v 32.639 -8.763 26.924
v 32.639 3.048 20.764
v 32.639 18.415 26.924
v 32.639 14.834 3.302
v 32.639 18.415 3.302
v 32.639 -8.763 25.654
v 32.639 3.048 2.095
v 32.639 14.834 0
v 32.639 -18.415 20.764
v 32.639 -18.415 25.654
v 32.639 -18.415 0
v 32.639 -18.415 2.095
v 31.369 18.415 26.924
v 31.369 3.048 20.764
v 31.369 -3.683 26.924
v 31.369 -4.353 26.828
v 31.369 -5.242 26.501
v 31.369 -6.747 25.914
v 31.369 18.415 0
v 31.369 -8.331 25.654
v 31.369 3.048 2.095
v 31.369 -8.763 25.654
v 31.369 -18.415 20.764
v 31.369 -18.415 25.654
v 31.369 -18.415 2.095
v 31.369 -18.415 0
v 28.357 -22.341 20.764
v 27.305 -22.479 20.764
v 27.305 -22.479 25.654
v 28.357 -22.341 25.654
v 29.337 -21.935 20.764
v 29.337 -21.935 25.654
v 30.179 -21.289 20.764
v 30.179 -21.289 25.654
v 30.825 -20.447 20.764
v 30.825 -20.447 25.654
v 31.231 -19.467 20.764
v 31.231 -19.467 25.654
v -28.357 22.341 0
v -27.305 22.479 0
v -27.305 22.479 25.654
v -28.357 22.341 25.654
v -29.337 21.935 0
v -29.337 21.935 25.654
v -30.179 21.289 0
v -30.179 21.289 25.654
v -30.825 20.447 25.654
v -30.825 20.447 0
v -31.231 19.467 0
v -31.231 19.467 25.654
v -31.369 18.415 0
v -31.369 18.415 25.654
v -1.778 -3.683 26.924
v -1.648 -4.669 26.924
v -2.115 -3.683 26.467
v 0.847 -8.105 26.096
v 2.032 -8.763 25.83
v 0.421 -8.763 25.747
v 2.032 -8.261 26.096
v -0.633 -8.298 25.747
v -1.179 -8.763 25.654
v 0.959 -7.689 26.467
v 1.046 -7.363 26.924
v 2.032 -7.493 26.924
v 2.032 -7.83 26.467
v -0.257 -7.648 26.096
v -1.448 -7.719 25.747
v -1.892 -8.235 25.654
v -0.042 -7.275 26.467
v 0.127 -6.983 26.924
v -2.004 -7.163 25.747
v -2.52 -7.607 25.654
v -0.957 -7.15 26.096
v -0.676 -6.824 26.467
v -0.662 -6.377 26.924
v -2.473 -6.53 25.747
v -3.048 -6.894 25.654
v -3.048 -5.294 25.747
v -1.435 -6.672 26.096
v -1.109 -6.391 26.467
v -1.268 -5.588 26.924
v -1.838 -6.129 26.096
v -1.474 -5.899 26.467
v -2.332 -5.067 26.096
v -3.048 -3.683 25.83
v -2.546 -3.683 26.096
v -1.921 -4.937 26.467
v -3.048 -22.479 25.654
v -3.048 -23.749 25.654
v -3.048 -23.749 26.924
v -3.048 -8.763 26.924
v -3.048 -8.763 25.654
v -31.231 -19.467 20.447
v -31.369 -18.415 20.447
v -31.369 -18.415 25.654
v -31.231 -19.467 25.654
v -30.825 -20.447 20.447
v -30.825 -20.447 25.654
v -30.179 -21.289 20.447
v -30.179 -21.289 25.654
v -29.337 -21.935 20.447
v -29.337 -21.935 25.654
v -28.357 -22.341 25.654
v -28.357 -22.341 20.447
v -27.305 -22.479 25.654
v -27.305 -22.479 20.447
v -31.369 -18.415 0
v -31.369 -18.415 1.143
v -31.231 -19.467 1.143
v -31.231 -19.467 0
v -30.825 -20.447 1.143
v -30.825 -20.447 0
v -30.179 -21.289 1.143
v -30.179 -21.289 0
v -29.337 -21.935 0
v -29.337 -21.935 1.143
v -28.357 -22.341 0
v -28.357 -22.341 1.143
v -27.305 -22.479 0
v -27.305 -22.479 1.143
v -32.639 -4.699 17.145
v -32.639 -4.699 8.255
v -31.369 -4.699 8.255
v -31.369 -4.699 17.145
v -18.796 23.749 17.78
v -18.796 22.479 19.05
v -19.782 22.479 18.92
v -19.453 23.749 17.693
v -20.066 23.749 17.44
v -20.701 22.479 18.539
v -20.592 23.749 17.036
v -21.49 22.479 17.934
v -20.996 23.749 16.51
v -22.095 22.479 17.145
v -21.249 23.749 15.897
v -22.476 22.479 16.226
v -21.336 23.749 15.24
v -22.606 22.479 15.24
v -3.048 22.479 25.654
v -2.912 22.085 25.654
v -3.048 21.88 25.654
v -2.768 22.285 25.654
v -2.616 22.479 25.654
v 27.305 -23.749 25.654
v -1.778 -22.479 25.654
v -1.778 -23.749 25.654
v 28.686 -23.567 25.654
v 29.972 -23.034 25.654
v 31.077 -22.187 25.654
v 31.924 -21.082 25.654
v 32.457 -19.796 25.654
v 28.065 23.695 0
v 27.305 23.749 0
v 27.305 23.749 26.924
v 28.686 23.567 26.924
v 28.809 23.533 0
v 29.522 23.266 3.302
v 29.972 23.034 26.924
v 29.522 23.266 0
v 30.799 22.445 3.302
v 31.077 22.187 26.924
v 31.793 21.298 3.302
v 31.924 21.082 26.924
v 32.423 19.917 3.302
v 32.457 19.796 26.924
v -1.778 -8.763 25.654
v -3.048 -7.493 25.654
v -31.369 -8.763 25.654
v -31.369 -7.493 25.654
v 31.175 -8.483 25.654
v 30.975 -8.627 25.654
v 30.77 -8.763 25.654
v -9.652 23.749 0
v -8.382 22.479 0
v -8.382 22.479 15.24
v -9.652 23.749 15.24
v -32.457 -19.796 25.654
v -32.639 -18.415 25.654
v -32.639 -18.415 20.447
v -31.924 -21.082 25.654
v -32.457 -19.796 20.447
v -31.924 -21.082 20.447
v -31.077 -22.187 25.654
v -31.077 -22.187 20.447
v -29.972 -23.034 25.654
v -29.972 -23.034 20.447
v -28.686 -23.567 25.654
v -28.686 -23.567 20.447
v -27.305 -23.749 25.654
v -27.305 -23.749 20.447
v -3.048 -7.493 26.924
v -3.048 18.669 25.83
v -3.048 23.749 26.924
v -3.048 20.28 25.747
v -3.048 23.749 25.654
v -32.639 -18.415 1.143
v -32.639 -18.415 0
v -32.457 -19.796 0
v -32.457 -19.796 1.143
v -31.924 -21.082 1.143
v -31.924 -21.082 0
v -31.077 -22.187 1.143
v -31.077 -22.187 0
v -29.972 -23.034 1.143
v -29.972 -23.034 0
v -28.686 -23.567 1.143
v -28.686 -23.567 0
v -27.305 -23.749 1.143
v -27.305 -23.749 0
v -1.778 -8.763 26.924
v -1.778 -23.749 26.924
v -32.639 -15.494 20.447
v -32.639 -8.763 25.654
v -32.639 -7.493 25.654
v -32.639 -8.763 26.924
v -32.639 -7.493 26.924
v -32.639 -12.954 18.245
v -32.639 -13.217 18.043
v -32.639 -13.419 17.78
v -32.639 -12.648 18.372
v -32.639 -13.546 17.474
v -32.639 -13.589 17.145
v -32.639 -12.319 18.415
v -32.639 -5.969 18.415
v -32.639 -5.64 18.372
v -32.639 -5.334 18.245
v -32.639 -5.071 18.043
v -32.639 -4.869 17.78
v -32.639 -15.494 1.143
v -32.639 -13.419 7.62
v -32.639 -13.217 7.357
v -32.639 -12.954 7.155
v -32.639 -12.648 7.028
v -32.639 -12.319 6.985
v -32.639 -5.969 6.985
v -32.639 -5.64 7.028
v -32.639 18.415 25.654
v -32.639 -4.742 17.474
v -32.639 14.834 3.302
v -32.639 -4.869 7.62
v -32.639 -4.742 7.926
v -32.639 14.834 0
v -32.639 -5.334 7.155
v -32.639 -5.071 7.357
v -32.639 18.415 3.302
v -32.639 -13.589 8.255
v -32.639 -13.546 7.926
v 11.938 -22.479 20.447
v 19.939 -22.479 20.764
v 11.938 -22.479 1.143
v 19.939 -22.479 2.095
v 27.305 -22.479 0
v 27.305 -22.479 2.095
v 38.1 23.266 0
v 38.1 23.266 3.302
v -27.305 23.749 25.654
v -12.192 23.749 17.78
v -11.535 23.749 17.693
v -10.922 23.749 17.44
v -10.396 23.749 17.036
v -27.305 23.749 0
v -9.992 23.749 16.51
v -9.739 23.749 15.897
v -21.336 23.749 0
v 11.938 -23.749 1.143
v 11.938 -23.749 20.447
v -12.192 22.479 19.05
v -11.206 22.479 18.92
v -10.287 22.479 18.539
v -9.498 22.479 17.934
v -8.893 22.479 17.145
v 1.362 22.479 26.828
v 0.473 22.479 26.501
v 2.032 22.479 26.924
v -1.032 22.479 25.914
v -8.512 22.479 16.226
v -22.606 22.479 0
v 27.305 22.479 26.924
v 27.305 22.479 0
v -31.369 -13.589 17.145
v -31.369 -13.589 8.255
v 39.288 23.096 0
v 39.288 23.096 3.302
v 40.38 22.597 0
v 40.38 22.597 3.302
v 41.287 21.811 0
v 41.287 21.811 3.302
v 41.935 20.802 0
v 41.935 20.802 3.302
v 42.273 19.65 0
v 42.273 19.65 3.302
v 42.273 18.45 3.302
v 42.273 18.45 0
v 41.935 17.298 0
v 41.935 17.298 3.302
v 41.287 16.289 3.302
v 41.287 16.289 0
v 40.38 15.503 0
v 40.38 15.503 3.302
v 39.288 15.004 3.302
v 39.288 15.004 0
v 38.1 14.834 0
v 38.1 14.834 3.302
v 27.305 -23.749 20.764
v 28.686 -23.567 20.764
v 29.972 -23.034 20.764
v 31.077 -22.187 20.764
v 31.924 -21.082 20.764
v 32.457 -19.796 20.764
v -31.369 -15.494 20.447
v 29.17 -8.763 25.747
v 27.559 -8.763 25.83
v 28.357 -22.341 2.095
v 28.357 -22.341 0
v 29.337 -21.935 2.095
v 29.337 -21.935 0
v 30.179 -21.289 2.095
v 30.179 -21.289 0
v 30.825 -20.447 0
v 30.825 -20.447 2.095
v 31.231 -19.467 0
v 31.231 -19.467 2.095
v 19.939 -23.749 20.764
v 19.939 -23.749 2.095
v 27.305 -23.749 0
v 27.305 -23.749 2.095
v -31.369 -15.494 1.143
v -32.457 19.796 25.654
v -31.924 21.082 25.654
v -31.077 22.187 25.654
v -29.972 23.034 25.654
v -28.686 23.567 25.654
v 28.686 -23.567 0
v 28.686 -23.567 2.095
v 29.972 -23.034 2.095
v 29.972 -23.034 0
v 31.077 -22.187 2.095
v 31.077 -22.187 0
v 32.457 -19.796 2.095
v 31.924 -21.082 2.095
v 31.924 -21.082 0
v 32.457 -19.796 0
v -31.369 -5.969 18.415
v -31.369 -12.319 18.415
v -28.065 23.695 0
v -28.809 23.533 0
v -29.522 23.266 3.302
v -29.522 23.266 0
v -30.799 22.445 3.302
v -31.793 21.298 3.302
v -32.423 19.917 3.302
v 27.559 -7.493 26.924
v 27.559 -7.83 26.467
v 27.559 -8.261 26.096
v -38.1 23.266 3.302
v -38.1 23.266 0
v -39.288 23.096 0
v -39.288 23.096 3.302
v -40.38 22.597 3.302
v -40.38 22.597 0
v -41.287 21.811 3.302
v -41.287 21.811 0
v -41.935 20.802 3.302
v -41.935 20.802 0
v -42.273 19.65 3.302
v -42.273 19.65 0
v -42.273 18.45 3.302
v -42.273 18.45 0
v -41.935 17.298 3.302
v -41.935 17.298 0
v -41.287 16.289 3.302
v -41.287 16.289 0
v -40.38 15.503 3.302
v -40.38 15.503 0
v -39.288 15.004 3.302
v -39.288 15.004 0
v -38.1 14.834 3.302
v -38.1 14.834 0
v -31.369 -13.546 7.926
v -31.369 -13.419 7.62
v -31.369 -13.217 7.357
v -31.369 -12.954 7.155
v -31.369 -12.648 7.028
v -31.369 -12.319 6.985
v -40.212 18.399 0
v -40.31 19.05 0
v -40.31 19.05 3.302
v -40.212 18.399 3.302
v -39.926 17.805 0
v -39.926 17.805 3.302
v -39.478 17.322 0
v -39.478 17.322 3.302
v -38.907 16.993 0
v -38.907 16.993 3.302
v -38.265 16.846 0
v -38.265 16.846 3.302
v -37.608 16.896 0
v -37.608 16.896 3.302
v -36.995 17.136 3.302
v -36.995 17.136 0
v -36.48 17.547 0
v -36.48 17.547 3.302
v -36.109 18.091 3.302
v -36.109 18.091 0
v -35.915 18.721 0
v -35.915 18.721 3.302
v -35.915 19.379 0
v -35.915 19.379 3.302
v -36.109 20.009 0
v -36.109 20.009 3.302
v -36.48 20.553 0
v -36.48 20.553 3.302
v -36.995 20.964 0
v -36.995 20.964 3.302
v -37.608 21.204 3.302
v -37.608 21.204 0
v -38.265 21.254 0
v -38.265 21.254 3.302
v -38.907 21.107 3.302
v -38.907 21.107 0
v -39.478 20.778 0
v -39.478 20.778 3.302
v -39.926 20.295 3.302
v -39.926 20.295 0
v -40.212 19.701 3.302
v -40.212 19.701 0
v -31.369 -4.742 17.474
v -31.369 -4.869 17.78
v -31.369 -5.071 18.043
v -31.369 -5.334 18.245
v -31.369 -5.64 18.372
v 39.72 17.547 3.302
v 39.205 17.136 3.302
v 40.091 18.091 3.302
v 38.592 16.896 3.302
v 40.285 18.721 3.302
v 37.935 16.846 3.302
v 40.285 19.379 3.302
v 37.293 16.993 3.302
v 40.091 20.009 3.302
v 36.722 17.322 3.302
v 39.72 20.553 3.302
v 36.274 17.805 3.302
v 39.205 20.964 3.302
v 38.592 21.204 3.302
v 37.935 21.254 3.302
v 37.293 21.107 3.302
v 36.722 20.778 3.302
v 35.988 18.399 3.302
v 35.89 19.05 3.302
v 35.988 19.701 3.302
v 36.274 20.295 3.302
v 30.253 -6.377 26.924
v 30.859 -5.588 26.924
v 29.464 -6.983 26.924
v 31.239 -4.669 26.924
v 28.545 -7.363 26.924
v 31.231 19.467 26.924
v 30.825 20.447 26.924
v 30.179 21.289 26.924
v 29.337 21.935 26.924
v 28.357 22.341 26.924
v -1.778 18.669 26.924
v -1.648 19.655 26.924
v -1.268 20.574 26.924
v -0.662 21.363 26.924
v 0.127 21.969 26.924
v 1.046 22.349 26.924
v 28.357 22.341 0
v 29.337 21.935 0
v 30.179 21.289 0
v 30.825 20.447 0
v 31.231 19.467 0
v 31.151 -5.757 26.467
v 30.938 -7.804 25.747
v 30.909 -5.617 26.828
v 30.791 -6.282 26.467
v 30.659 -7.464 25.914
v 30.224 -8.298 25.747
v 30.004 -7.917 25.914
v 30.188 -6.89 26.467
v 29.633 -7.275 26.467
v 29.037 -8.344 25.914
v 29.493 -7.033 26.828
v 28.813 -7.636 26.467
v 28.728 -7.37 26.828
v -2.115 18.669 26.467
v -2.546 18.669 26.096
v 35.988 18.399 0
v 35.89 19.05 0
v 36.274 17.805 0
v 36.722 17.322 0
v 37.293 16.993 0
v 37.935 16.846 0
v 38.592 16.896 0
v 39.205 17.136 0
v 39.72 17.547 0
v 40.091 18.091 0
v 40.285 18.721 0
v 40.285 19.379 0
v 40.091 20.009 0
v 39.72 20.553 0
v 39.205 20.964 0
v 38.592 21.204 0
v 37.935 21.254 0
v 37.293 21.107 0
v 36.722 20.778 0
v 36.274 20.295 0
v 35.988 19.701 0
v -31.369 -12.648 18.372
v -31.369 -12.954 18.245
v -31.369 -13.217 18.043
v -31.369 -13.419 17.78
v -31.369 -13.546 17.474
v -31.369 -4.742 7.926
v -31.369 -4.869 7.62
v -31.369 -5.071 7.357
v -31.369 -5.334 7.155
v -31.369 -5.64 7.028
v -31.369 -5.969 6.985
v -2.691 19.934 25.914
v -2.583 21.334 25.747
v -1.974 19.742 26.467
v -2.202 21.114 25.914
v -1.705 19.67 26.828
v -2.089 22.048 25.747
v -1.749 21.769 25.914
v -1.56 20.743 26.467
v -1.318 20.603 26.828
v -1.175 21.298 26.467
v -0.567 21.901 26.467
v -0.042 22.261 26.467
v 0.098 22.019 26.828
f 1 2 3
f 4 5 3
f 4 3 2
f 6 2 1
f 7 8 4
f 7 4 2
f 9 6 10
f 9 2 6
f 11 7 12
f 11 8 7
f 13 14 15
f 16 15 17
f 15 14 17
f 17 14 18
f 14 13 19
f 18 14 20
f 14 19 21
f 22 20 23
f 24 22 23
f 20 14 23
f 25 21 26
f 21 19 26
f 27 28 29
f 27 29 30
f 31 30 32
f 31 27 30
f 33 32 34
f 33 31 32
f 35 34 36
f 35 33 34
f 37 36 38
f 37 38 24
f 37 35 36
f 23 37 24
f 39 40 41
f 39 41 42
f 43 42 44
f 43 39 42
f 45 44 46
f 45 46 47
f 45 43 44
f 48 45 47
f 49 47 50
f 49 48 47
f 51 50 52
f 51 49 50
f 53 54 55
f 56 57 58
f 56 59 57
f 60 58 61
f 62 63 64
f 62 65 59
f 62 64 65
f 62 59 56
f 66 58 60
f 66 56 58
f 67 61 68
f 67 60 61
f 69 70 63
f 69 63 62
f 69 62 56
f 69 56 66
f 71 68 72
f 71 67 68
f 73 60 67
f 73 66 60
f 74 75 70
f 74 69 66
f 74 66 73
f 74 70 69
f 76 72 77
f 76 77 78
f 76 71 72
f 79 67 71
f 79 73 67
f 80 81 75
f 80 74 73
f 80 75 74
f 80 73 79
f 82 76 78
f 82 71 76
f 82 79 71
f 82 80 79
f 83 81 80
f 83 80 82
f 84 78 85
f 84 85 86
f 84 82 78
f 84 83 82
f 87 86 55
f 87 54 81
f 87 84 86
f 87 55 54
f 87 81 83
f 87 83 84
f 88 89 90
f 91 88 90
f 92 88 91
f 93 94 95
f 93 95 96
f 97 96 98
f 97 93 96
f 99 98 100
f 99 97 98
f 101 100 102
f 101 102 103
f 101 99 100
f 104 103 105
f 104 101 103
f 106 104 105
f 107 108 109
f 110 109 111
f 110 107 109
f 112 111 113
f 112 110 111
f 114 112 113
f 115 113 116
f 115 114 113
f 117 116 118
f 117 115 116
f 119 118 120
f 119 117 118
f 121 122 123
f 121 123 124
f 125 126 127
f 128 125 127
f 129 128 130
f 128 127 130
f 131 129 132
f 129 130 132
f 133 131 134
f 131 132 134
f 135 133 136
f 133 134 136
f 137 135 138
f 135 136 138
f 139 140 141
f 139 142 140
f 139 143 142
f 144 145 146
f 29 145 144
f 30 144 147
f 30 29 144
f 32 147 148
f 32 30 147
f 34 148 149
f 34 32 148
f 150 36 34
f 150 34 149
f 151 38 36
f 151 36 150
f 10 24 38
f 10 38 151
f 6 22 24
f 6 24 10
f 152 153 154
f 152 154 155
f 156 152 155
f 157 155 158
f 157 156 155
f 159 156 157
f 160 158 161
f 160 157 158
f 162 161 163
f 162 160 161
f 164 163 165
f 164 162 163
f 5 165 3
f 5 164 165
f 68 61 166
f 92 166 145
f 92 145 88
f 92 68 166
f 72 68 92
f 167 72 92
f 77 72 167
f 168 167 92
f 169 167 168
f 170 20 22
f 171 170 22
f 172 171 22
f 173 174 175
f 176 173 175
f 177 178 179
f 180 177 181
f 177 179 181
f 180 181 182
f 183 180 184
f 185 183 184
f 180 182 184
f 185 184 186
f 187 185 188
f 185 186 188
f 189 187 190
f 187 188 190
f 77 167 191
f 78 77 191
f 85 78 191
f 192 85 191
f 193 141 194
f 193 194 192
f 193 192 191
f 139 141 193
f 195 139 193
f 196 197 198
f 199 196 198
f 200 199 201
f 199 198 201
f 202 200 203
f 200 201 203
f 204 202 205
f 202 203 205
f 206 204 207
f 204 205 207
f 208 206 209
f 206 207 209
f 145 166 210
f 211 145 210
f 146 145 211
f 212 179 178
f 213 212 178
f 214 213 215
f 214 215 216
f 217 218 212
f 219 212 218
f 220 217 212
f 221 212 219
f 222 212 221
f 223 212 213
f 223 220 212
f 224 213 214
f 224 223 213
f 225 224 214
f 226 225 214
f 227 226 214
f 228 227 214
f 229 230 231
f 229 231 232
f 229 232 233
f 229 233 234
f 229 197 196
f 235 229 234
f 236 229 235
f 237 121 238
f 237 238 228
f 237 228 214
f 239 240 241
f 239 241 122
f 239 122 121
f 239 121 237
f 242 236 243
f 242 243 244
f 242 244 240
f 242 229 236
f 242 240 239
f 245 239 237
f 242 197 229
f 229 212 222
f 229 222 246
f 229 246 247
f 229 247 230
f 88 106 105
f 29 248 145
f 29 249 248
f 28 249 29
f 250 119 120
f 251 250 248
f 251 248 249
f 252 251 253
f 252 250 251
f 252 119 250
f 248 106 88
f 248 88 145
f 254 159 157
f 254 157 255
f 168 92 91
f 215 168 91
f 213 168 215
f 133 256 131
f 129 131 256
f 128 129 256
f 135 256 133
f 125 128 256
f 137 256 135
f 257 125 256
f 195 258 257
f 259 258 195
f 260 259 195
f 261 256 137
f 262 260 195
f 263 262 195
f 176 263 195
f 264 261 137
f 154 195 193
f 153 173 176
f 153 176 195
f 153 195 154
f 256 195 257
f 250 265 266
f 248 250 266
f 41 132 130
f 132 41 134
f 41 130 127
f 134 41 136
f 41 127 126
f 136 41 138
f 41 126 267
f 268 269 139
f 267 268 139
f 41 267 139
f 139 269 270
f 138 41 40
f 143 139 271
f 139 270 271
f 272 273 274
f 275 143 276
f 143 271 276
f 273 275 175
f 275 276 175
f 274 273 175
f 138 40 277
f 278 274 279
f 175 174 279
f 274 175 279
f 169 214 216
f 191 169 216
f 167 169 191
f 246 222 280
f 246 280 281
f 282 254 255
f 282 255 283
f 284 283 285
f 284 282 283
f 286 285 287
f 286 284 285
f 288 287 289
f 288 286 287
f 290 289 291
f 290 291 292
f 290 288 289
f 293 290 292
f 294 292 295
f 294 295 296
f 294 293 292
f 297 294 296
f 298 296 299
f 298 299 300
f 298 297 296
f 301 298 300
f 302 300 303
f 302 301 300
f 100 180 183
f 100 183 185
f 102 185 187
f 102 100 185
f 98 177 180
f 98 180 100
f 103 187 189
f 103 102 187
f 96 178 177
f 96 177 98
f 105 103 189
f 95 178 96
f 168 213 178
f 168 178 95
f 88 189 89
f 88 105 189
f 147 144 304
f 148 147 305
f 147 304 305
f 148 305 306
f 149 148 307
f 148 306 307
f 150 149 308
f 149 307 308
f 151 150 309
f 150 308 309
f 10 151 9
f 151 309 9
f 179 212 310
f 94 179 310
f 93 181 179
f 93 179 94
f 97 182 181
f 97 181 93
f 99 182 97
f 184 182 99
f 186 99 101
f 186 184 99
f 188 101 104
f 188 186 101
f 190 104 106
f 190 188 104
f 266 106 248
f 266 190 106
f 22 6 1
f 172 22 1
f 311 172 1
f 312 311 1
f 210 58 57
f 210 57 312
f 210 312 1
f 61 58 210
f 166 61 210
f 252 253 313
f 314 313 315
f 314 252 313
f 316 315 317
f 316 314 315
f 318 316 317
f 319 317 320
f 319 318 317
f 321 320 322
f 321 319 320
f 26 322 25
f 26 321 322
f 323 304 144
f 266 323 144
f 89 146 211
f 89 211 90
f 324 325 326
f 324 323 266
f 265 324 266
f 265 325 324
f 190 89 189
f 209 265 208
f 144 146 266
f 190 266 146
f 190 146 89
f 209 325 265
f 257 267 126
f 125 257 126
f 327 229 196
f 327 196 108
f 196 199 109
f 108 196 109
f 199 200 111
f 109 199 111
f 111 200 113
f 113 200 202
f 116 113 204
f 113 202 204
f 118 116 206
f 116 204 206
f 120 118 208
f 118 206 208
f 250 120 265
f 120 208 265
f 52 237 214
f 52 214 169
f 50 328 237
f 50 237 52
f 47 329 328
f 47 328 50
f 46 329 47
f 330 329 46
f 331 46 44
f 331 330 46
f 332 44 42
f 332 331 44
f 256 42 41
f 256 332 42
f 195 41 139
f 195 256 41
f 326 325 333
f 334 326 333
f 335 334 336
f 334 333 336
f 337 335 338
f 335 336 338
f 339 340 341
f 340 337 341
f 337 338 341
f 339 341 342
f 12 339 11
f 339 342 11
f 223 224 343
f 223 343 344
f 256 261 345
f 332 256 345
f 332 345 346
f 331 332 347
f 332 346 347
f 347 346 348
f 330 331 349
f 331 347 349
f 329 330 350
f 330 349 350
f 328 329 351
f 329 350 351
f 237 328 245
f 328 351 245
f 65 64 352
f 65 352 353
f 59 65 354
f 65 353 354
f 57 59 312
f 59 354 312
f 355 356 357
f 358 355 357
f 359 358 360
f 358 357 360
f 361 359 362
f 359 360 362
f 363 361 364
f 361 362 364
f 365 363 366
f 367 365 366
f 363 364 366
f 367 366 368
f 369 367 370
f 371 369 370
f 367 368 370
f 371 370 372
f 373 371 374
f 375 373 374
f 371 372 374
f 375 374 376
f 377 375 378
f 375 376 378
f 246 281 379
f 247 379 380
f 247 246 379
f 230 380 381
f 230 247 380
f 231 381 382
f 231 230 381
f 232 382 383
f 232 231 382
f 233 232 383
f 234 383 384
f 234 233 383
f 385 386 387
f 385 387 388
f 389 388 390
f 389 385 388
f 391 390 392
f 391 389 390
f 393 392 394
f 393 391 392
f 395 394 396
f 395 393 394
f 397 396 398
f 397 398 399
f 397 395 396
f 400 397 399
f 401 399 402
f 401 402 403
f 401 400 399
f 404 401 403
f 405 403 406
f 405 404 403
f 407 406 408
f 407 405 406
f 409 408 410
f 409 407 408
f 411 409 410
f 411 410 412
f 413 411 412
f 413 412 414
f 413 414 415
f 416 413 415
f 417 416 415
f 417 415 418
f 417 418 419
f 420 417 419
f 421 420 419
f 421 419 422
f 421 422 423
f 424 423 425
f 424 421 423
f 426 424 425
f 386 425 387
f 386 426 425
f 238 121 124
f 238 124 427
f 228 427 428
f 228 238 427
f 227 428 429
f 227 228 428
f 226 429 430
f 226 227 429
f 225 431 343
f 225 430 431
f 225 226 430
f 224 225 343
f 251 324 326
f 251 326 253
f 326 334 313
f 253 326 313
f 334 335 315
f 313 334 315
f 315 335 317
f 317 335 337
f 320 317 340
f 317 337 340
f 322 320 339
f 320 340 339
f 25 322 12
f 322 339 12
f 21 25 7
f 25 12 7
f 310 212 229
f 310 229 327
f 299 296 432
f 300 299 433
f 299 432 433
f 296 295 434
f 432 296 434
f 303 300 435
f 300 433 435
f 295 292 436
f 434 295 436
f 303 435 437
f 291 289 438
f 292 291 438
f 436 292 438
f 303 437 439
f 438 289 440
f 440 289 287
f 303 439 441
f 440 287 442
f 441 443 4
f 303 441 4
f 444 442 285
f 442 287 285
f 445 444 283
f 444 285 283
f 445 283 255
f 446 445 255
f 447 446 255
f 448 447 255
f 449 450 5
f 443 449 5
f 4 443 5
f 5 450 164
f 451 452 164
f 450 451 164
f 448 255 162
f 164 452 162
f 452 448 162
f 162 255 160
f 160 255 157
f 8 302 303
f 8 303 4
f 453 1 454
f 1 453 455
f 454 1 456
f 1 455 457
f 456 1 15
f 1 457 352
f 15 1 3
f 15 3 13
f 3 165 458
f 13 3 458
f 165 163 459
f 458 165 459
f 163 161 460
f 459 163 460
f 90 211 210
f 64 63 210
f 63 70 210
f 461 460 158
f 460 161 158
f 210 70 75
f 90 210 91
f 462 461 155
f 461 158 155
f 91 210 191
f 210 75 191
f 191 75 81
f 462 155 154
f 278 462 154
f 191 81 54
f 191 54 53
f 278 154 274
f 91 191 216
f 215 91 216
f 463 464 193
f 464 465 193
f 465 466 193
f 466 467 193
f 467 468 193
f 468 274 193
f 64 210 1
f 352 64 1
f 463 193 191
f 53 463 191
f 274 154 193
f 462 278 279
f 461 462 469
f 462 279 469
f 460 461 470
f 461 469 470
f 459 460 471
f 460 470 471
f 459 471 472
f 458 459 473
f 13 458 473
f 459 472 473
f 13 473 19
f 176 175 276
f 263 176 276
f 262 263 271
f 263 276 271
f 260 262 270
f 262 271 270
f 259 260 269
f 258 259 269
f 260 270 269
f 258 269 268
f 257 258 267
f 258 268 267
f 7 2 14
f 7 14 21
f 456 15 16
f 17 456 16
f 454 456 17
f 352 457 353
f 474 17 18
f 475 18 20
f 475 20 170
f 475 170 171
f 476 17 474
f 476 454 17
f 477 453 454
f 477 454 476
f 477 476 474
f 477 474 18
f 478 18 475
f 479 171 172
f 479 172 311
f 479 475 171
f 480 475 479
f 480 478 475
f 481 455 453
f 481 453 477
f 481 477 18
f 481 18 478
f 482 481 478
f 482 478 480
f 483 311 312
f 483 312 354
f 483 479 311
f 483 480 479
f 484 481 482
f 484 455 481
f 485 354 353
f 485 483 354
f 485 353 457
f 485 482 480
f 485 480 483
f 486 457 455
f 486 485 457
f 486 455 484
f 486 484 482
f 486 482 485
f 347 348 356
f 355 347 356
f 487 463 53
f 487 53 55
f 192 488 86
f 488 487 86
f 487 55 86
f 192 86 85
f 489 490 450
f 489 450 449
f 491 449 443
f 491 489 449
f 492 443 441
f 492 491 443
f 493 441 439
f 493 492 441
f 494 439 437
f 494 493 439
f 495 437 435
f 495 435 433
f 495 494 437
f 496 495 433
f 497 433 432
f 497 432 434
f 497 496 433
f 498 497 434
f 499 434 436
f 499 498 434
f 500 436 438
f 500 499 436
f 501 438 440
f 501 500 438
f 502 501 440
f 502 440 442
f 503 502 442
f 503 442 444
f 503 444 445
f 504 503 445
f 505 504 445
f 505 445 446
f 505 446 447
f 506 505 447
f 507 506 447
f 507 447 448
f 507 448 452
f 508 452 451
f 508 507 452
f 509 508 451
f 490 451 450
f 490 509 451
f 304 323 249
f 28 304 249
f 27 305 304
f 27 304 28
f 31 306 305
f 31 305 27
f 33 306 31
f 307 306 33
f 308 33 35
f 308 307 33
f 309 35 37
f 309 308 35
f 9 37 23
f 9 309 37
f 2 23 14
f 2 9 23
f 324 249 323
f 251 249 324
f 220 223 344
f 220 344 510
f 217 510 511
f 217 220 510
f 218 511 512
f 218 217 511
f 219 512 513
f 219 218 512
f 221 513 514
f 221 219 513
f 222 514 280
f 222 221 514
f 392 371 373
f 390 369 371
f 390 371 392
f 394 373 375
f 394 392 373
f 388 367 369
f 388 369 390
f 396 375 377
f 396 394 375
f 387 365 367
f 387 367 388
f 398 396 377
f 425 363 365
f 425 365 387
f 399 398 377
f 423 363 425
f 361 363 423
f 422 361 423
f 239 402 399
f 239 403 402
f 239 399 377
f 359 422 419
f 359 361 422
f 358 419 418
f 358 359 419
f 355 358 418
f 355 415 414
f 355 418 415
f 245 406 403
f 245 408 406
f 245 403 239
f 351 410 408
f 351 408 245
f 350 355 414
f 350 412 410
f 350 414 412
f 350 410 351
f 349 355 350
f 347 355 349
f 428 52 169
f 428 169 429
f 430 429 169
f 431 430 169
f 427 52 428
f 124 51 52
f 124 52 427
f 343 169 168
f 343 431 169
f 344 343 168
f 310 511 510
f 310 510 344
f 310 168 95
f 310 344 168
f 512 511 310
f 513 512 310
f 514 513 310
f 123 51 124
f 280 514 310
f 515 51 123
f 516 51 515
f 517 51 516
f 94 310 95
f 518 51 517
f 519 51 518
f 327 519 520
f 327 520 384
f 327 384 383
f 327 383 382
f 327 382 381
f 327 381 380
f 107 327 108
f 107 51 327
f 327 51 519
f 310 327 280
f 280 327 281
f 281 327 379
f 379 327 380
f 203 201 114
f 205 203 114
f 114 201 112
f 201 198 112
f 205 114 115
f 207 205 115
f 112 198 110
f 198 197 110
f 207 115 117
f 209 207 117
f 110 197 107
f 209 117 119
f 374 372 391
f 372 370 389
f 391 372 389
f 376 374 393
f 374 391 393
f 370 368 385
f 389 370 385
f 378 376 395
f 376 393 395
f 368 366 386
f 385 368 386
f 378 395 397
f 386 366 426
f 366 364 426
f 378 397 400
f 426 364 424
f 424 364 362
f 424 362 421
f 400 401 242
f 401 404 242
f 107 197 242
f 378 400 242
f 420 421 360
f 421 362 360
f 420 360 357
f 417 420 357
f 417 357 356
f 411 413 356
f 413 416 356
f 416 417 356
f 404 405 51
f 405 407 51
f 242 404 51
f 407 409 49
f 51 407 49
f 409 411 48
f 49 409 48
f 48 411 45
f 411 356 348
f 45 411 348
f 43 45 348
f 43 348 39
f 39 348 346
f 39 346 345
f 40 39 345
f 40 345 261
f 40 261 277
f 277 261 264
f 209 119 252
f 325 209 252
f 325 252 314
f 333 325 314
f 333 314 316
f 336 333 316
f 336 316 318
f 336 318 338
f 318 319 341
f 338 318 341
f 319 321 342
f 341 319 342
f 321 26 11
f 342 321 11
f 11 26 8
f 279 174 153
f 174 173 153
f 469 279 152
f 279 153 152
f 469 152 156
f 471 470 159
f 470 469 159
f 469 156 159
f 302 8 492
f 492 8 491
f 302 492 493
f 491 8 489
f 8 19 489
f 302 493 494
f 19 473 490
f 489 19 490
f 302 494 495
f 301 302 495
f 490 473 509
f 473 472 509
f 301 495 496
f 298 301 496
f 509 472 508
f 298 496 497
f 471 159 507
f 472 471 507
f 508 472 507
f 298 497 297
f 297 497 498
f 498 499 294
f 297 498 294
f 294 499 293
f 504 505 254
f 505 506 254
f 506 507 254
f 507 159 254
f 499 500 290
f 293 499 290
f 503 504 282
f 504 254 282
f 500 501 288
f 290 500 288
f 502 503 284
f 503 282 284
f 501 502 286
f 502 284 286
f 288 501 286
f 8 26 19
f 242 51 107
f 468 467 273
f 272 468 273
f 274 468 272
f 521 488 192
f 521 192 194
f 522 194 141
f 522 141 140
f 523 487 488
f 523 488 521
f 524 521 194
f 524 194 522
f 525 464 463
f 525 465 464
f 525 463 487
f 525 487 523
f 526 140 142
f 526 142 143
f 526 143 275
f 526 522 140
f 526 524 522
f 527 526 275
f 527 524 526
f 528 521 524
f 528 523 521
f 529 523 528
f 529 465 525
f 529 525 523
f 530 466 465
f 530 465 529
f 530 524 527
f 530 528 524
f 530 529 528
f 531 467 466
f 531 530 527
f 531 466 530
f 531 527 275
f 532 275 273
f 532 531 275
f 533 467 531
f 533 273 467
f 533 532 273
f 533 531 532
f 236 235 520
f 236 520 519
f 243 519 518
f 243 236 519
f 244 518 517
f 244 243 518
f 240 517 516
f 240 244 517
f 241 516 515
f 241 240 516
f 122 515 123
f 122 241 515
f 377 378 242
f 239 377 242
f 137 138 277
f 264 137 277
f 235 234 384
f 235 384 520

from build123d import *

# Parameters (mm, degrees)
BOSS_EXTRUDE1_DEPTH = 25.654
BOSS_EXTRUDE2_DEPTH = 1.27
CUT_EXTRUDE1_REACH  = 65.61
CUT_EXTRUDE2_REACH  = 76.499
SKETCH7_W           = 44.577
SKETCH7_H           = 19.304
CUT_EXTRUDE3_DEPTH  = 8.255
SKETCH8_W           = 18.669
SKETCH8_H           = 26.797
CUT_EXTRUDE4_DEPTH  = 12.7
FILLET2_R           = 2.54
SKETCH9_R           = 2.2098
BOSS_EXTRUDE3_DEPTH = 3.302
CHAMFER1_SIZE       = 1.27


# Some blends are built 0.0001 mm under size
with BuildPart() as part:
    # Sketch2 → Boss-Extrude1 (new body)
    with BuildSketch(Plane.XY):
        with BuildLine():
            Line((-27.305, -23.749), (27.305, -23.749))
            ThreePointArc((27.305, -23.749), (31.076707571, -22.186707571), (32.639, -18.415))
            Line((32.639, -18.415), (32.639, 18.415))
            ThreePointArc((32.639, 18.415), (31.076707571, 22.186707571), (27.305, 23.749))
            Line((27.305, 23.749), (-27.305, 23.749))
            ThreePointArc((-27.305, 23.749), (-31.076707571, 22.186707571), (-32.639, 18.415))
            Line((-32.639, 18.415), (-32.639, -18.415))
            ThreePointArc((-32.639, -18.415), (-31.076707571, -22.186707571), (-27.305, -23.749))
        make_face()
        with BuildLine():
            Line((-27.305, -22.479), (27.305, -22.479))
            ThreePointArc((27.305, -22.479), (30.178681959, -21.288681959), (31.369, -18.415))
            Line((31.369, -18.415), (31.369, 18.415))
            ThreePointArc((31.369, 18.415), (30.178681959, 21.288681959), (27.305, 22.479))
            Line((27.305, 22.479), (-27.305, 22.479))
            ThreePointArc((-27.305, 22.479), (-30.178681959, 21.288681959), (-31.369, 18.415))
            Line((-31.369, 18.415), (-31.369, -18.415))
            ThreePointArc((-31.369, -18.415), (-30.178681959, -21.288681959), (-27.305, -22.479))
        make_face(mode=Mode.SUBTRACT)
    extrude(amount=BOSS_EXTRUDE1_DEPTH)

    # Sketch3 → Boss-Extrude2 (add)
    with BuildSketch(Plane.XY.offset(25.654)):
        with BuildLine():
            Line((-1.778, 23.749), (27.305, 23.749))
            ThreePointArc((27.305, 23.749), (31.076707571, 22.186707571), (32.639, 18.415))
            Line((32.639, 18.415), (32.639, -7.493))
            Line((32.639, -7.493), (32.639, -8.763))
            Line((32.639, -8.763), (-1.778, -8.763))
            Line((-1.778, -8.763), (-1.778, -23.749))
            Line((-1.778, -23.749), (-3.048, -23.749))
            Line((-3.048, -23.749), (-3.048, -8.763))
            Line((-3.048, -8.763), (-32.639, -8.763))
            Line((-32.639, -8.763), (-32.639, -7.493))
            Line((-32.639, -7.493), (-3.048, -7.493))
            Line((-3.048, -7.493), (-3.048, 23.749))
            Line((-3.048, 23.749), (-1.778, 23.749))
        make_face()
        with BuildLine():
            Line((27.559, -7.493), (2.032, -7.493))
            ThreePointArc((2.032, -7.493), (-0.662076836, -6.377076836), (-1.778, -3.683))
            Line((-1.778, -3.683), (-1.778, 18.669))
            ThreePointArc((-1.778, 18.669), (-0.662076836, 21.363076836), (2.032, 22.479))
            Line((2.032, 22.479), (27.305, 22.479))
            ThreePointArc((27.305, 22.479), (30.178681959, 21.288681959), (31.369, 18.415))
            Line((31.369, 18.415), (31.369, -3.683))
            ThreePointArc((31.369, -3.683), (30.253076836, -6.377076836), (27.559, -7.493))
        make_face(mode=Mode.SUBTRACT)
    extrude(amount=BOSS_EXTRUDE2_DEPTH)

    # Sketch5 → Cut-Extrude1 (cut, up to next)
    with BuildSketch(Plane(origin=(0, 23.749, 0), x_dir=(1, 0, 0), z_dir=(0, 1, 0)), mode=Mode.PRIVATE) as cut_extrude1_sk1:
        with BuildLine():
            Line((-21.336, 0), (-21.336, -15.24))
            ThreePointArc((-21.336, -15.24), (-20.592051224, -17.036051224), (-18.796, -17.78))
            Line((-18.796, -17.78), (-12.192, -17.78))
            ThreePointArc((-12.192, -17.78), (-10.395948776, -17.036051224), (-9.652, -15.24))
            Line((-9.652, -15.24), (-9.652, 0))
            Line((-9.652, 0), (-21.336, 0))
        make_face()
    cut_extrude1_tool1 = extrude(cut_extrude1_sk1.sketch, amount=-CUT_EXTRUDE1_REACH, mode=Mode.PRIVATE) & part.part
    add(cut_extrude1_tool1.solids().sort_by_distance((-15.494, 23.749, 8.777566))[0], mode=Mode.SUBTRACT)

    # Sketch6 → Cut-Extrude2 (cut, up to next)
    with BuildSketch(Plane.ZY.offset(32.639), mode=Mode.PRIVATE) as cut_extrude2_sk1:
        with BuildLine():
            Line((8.255, -4.699), (17.145, -4.699))
            ThreePointArc((17.145, -4.699), (18.043025612, -5.070974388), (18.415, -5.969))
            Line((18.415, -5.969), (18.415, -12.319))
            ThreePointArc((18.415, -12.319), (18.043025612, -13.217025612), (17.145, -13.589))
            Line((17.145, -13.589), (8.255, -13.589))
            ThreePointArc((8.255, -13.589), (7.356974388, -13.217025612), (6.985, -12.319))
            Line((6.985, -12.319), (6.985, -5.969))
            ThreePointArc((6.985, -5.969), (7.356974388, -5.070974388), (8.255, -4.699))
        make_face()
    cut_extrude2_tool1 = extrude(cut_extrude2_sk1.sketch, amount=-CUT_EXTRUDE2_REACH, mode=Mode.PRIVATE) & part.part
    add(cut_extrude2_tool1.solids().sort_by_distance((-32.639, -9.144, 12.7))[0], mode=Mode.SUBTRACT)

    # Sketch7 → Cut-Extrude3 (cut)
    with BuildSketch(Plane.XZ.offset(23.749)):
        with Locations((-10.3505, 10.795)):
            Rectangle(SKETCH7_W, SKETCH7_H)
    extrude(amount=-CUT_EXTRUDE3_DEPTH, mode=Mode.SUBTRACT)

    # Sketch8 → Cut-Extrude4 (cut)
    with BuildSketch(Plane(origin=(32.639, 0, 0), x_dir=(0, 0, -1), z_dir=(1, 0, 0))):
        with Locations((-11.43, -10.3505)):
            Rectangle(SKETCH8_W, SKETCH8_H)
    extrude(amount=-CUT_EXTRUDE4_DEPTH, mode=Mode.SUBTRACT)

    # Fillet2
    # the kernel refuses this fillet: 2.54 mm, written as the material it takes off along each edge
    with BuildSketch(Plane(origin=(2.032, 18.669, 25.654), x_dir=(-1, 0, 0), z_dir=(0, -1, 0))) as fillet2_piece_1_section:
        with BuildLine():
            CenterArc((6.009704526, -2.54), FILLET2_R, 90, 60)
            Line((3.81, -1.27), (3.81, 0))
            Line((3.81, 0), (6.009704526, 0))
        make_face()
    fillet2_piece_1 = revolve(axis=Axis((2.032, 18.669, 25.654), (0, 0, -1)), revolution_arc=172.73255531, mode=Mode.PRIVATE)
    fillet2_piece_1 = split(fillet2_piece_1, bisect_by=Plane(origin=(2.032, 22.479, 25.654), z_dir=(0, -1, 0)), keep=Keep.TOP, mode=Mode.PRIVATE)
    add(fillet2_piece_1, mode=Mode.SUBTRACT)
    with BuildSketch(Plane(origin=(2.032, -3.683, 25.654), x_dir=(0, -1, 0), z_dir=(1, 0, 0))) as fillet2_piece_2:
        with BuildLine():
            CenterArc((6.009704526, -2.54), FILLET2_R, 90, 60)
            Line((3.81, -1.27), (3.81, 0))
            Line((3.81, 0), (6.009704526, 0))
        make_face()
    revolve(axis=Axis((2.032, -3.683, 25.654), (0, 0, -1)), revolution_arc=90, mode=Mode.SUBTRACT)
    with BuildSketch(Plane(origin=(27.559, -3.683, 25.654), x_dir=(0.1265009963233053, 0.9919664802447767, 0), z_dir=(-0.9919664802447767, 0.1265009963233053, 0))) as fillet2_piece_3_section:
        with BuildLine():
            CenterArc((6.009704526, -2.54), FILLET2_R, 90, 60)
            Line((3.81, -1.27), (3.81, 0))
            Line((3.81, 0), (6.009704526, 0))
        make_face()
    fillet2_piece_3 = revolve(axis=Axis((27.559, -3.683, 25.654), (0, 0, -1)), revolution_arc=172.73255531, mode=Mode.PRIVATE)
    fillet2_piece_3 = split(fillet2_piece_3, bisect_by=Plane(origin=(31.369, -3.683, 25.654), z_dir=(-1, 0, 0)), keep=Keep.TOP, mode=Mode.PRIVATE)
    add(fillet2_piece_3, mode=Mode.SUBTRACT)
    with BuildSketch(Plane(origin=(27.559, -7.493, 25.654), x_dir=(0, -1, 0), z_dir=(-1, 0, 0))) as fillet2_piece_4:
        with BuildLine():
            CenterArc((2.199704526, 2.54), FILLET2_R, 210, 60)
            Line((0, 1.27), (0, 0))
            Line((0, 0), (2.199704526, 0))
        make_face()
    extrude(amount=25.527, mode=Mode.SUBTRACT)
    with BuildSketch(Plane(origin=(-1.778, -3.683, 25.654), x_dir=(-1, 0, 0), z_dir=(0, 1, 0))) as fillet2_piece_5:
        with BuildLine():
            CenterArc((2.199704526, 2.54), FILLET2_R, 210, 60)
            Line((0, 1.27), (0, 0))
            Line((0, 0), (2.199704526, 0))
        make_face()
    extrude(amount=22.352, mode=Mode.SUBTRACT)

    # Sketch9 → Boss-Extrude3 (add)
    # profile 1 of 2: a face of its own
    with BuildSketch(Plane.XY):
        with BuildLine():
            Line((-29.522086836, 23.2664), (-38.1, 23.2664))
            ThreePointArc((-38.1, 23.2664), (-42.3164, 19.05), (-38.1, 14.8336))
            Line((-38.1, 14.8336), (-32.639, 14.8336))
            Line((-32.639, 14.8336), (-32.639, 18.415))
            ThreePointArc((-32.639, 18.415), (-31.792621708, 21.298193959), (-29.522086836, 23.2664))
        make_face()
        with Locations(Location((-38.1, 19.05, 0), (0, 0, 180))):
            Circle(SKETCH9_R, mode=Mode.SUBTRACT)
    # profile 2 of 2: a face of its own
    with BuildSketch(Plane.XY):
        with BuildLine():
            Line((29.522086836, 23.2664), (38.1, 23.2664))
            ThreePointArc((38.1, 23.2664), (42.3164, 19.05), (38.1, 14.8336))
            Line((38.1, 14.8336), (32.639, 14.8336))
            Line((32.639, 14.8336), (32.639, 18.415))
            ThreePointArc((32.639, 18.415), (31.792621708, 21.298193959), (29.522086836, 23.2664))
        make_face()
        with Locations(Location((38.1, 19.05, 0), (0, 0, 180))):
            Circle(SKETCH9_R, mode=Mode.SUBTRACT)
    extrude(amount=BOSS_EXTRUDE3_DEPTH)

    # Chamfer1
    chamfer1_edges = [part.edges().sort_by_distance(p)[0] for p in [
        (-21.336, 22.479, 7.62),
        (-20.592051224, 22.479, 17.036051224),
        (-15.494, 22.479, 17.78),
        (-10.395948776, 22.479, 17.036051224),
        (-9.652, 22.479, 7.62),
    ]]
    chamfer(chamfer1_edges, length=CHAMFER1_SIZE - 0.0001)  # a hair under: the kernel refuses the full size


solid = part.part
